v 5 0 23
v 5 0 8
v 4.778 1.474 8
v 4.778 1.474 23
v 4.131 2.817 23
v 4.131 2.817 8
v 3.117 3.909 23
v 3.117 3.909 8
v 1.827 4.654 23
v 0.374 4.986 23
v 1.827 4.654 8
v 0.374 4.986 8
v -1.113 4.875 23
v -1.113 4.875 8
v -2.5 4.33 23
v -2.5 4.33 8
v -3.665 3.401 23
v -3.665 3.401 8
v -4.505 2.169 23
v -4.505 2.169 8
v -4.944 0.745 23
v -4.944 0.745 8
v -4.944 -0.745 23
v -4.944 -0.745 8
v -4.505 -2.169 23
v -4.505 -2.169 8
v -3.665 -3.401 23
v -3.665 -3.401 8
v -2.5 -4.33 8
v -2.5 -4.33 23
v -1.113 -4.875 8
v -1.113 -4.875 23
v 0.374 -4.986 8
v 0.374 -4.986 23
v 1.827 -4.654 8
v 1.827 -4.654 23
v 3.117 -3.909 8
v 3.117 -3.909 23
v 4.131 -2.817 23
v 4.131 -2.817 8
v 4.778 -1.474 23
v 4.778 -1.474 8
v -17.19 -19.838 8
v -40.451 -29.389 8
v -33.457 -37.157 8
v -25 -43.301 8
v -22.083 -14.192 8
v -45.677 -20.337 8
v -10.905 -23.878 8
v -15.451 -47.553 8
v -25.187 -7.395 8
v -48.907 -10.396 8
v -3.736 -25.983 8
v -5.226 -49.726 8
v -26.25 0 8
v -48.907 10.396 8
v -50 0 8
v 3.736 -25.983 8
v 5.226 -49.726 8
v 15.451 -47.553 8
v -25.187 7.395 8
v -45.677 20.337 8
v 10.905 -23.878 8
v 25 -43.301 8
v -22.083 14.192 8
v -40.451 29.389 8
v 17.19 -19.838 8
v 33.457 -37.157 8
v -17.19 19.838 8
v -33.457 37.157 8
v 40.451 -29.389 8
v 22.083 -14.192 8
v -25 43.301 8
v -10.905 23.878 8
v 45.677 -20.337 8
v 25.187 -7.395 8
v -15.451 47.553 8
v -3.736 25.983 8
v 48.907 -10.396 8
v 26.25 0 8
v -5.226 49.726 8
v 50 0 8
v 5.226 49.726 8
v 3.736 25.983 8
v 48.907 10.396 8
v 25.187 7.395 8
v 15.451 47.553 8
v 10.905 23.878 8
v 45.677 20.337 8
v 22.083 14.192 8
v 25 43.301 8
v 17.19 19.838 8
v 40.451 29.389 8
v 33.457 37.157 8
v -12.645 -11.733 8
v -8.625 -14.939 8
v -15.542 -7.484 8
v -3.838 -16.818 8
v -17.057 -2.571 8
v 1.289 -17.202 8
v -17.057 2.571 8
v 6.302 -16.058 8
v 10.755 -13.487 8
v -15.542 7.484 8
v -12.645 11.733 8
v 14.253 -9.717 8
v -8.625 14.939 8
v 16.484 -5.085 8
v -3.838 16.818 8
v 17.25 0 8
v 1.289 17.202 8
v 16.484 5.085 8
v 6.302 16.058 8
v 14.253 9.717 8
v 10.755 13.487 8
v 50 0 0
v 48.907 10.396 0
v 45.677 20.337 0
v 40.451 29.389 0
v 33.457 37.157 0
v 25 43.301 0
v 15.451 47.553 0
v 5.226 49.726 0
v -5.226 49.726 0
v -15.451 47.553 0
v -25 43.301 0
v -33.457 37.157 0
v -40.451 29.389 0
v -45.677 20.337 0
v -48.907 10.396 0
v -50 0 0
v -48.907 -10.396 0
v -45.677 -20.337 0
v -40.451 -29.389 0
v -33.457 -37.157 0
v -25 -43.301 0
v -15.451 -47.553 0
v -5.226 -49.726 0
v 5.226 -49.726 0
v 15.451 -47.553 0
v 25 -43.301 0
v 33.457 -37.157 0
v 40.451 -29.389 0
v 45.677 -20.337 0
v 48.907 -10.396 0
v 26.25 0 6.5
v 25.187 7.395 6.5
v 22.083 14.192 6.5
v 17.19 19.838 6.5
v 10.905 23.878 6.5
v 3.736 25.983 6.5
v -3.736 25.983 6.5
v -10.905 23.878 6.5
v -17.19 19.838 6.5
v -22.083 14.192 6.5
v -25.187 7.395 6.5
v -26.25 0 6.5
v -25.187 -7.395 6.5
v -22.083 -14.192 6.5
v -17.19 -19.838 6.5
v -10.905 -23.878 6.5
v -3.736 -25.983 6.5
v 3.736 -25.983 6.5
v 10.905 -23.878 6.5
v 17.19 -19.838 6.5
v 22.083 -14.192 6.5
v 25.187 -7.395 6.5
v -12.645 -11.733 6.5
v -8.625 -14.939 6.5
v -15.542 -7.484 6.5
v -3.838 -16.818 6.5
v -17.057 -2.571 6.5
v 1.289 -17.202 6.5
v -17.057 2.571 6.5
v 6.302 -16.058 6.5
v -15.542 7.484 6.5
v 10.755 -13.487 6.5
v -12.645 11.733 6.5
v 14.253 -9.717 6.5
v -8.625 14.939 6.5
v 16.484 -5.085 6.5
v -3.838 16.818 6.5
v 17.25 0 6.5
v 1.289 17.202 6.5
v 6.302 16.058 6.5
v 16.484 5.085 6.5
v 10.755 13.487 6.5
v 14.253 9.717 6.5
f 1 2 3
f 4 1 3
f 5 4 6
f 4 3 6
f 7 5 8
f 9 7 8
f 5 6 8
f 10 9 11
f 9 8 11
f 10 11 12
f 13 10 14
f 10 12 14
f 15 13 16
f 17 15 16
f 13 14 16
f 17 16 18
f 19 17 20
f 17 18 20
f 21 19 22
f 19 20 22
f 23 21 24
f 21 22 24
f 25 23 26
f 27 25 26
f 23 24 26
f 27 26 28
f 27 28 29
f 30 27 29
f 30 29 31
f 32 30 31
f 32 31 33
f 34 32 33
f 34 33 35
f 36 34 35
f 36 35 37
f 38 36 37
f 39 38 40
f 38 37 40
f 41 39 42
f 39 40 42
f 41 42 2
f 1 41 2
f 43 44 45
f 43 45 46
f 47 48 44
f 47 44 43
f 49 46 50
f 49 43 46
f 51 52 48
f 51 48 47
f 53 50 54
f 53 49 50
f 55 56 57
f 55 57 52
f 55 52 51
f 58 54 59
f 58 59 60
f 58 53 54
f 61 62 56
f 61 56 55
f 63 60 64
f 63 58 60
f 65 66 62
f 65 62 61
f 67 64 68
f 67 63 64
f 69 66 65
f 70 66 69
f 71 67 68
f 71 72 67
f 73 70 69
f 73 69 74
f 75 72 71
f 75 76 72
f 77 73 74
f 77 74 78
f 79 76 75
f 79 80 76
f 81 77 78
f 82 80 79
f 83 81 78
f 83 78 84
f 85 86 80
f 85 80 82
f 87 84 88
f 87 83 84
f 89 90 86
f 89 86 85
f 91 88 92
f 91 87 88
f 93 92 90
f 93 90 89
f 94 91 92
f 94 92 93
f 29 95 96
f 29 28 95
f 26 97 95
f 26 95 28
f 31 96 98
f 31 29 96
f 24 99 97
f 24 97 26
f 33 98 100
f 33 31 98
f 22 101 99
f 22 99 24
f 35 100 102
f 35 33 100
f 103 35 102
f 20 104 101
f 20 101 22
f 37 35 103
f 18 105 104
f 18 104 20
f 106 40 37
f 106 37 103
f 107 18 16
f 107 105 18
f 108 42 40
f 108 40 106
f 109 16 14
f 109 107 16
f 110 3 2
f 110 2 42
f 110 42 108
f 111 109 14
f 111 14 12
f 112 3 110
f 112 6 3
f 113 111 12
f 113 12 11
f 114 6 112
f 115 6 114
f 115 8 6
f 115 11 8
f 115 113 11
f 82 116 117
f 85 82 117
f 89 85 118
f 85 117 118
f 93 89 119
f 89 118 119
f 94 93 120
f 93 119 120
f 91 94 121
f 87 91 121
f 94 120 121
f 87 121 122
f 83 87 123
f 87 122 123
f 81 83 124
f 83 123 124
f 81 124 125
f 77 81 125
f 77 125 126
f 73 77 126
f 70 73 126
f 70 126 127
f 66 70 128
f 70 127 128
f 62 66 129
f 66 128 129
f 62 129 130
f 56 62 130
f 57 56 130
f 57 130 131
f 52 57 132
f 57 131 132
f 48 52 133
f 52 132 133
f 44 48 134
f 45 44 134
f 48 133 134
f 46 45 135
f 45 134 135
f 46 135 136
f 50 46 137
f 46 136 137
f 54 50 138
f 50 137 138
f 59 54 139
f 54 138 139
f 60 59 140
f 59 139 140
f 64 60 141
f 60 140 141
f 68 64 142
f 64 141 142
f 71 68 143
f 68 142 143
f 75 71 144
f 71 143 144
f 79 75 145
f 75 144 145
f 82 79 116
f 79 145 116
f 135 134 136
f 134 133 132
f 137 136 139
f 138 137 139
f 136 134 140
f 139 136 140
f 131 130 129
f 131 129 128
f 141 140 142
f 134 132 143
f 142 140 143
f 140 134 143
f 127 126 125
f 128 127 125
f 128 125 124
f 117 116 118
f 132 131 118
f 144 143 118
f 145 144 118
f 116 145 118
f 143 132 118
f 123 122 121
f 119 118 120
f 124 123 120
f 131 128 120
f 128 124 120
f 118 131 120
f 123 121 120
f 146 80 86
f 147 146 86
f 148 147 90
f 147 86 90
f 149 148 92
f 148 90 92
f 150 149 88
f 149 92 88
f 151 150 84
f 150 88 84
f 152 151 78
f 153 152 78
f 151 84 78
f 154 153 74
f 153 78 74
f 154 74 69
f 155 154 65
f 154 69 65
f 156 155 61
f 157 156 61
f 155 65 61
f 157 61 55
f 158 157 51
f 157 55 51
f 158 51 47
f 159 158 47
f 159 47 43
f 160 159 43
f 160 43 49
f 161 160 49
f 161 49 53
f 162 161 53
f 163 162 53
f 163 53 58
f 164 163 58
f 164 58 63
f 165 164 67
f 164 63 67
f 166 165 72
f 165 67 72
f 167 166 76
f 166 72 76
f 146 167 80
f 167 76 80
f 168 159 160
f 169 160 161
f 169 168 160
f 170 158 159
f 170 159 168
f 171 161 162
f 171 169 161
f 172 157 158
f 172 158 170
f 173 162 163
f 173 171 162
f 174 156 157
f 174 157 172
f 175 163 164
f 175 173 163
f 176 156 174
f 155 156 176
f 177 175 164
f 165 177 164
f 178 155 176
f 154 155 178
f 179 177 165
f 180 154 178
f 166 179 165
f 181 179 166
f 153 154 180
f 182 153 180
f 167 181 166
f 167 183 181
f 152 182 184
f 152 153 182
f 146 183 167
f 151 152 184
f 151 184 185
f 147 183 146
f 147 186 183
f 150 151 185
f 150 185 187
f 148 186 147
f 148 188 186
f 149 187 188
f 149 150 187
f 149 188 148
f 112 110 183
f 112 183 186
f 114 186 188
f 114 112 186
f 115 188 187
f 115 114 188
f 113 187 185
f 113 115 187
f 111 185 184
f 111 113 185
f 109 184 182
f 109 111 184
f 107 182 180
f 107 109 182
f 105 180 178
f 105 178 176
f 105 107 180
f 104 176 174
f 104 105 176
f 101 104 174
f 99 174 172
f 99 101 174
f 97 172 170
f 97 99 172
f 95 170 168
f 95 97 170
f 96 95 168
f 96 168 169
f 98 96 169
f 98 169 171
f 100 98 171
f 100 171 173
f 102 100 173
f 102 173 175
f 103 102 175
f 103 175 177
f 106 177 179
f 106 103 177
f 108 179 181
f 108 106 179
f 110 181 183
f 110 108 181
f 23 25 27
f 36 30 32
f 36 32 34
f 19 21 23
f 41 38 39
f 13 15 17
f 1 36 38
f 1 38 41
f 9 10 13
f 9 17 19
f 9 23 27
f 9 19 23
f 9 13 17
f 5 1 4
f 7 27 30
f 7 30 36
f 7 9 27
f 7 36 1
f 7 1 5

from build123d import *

# Parameters (mm, degrees)
F0_R     = 50
F1_DEPTH = 8
F2_R     = 26.25
F2_R_2   = 17.25
F3_DEPTH = 1.5
F4_R     = 5
F5_DEPTH = 15


with BuildPart() as f1:
    # F0 (on Top) → F1 (new body)
    with BuildSketch(Plane.XY):
        Circle(F0_R)
    extrude(amount=F1_DEPTH)

    # F2 (on face) → F3 (cut)
    with BuildSketch(Plane.XY.offset(8)):
        Circle(F2_R)
        Circle(F2_R_2, mode=Mode.SUBTRACT)
    extrude(amount=-F3_DEPTH, mode=Mode.SUBTRACT)

    # F4 (on face) → F5 (join)
    with BuildSketch(Plane.XY.offset(8)):
        Circle(F4_R)
    extrude(amount=F5_DEPTH)


solid = f1.part
